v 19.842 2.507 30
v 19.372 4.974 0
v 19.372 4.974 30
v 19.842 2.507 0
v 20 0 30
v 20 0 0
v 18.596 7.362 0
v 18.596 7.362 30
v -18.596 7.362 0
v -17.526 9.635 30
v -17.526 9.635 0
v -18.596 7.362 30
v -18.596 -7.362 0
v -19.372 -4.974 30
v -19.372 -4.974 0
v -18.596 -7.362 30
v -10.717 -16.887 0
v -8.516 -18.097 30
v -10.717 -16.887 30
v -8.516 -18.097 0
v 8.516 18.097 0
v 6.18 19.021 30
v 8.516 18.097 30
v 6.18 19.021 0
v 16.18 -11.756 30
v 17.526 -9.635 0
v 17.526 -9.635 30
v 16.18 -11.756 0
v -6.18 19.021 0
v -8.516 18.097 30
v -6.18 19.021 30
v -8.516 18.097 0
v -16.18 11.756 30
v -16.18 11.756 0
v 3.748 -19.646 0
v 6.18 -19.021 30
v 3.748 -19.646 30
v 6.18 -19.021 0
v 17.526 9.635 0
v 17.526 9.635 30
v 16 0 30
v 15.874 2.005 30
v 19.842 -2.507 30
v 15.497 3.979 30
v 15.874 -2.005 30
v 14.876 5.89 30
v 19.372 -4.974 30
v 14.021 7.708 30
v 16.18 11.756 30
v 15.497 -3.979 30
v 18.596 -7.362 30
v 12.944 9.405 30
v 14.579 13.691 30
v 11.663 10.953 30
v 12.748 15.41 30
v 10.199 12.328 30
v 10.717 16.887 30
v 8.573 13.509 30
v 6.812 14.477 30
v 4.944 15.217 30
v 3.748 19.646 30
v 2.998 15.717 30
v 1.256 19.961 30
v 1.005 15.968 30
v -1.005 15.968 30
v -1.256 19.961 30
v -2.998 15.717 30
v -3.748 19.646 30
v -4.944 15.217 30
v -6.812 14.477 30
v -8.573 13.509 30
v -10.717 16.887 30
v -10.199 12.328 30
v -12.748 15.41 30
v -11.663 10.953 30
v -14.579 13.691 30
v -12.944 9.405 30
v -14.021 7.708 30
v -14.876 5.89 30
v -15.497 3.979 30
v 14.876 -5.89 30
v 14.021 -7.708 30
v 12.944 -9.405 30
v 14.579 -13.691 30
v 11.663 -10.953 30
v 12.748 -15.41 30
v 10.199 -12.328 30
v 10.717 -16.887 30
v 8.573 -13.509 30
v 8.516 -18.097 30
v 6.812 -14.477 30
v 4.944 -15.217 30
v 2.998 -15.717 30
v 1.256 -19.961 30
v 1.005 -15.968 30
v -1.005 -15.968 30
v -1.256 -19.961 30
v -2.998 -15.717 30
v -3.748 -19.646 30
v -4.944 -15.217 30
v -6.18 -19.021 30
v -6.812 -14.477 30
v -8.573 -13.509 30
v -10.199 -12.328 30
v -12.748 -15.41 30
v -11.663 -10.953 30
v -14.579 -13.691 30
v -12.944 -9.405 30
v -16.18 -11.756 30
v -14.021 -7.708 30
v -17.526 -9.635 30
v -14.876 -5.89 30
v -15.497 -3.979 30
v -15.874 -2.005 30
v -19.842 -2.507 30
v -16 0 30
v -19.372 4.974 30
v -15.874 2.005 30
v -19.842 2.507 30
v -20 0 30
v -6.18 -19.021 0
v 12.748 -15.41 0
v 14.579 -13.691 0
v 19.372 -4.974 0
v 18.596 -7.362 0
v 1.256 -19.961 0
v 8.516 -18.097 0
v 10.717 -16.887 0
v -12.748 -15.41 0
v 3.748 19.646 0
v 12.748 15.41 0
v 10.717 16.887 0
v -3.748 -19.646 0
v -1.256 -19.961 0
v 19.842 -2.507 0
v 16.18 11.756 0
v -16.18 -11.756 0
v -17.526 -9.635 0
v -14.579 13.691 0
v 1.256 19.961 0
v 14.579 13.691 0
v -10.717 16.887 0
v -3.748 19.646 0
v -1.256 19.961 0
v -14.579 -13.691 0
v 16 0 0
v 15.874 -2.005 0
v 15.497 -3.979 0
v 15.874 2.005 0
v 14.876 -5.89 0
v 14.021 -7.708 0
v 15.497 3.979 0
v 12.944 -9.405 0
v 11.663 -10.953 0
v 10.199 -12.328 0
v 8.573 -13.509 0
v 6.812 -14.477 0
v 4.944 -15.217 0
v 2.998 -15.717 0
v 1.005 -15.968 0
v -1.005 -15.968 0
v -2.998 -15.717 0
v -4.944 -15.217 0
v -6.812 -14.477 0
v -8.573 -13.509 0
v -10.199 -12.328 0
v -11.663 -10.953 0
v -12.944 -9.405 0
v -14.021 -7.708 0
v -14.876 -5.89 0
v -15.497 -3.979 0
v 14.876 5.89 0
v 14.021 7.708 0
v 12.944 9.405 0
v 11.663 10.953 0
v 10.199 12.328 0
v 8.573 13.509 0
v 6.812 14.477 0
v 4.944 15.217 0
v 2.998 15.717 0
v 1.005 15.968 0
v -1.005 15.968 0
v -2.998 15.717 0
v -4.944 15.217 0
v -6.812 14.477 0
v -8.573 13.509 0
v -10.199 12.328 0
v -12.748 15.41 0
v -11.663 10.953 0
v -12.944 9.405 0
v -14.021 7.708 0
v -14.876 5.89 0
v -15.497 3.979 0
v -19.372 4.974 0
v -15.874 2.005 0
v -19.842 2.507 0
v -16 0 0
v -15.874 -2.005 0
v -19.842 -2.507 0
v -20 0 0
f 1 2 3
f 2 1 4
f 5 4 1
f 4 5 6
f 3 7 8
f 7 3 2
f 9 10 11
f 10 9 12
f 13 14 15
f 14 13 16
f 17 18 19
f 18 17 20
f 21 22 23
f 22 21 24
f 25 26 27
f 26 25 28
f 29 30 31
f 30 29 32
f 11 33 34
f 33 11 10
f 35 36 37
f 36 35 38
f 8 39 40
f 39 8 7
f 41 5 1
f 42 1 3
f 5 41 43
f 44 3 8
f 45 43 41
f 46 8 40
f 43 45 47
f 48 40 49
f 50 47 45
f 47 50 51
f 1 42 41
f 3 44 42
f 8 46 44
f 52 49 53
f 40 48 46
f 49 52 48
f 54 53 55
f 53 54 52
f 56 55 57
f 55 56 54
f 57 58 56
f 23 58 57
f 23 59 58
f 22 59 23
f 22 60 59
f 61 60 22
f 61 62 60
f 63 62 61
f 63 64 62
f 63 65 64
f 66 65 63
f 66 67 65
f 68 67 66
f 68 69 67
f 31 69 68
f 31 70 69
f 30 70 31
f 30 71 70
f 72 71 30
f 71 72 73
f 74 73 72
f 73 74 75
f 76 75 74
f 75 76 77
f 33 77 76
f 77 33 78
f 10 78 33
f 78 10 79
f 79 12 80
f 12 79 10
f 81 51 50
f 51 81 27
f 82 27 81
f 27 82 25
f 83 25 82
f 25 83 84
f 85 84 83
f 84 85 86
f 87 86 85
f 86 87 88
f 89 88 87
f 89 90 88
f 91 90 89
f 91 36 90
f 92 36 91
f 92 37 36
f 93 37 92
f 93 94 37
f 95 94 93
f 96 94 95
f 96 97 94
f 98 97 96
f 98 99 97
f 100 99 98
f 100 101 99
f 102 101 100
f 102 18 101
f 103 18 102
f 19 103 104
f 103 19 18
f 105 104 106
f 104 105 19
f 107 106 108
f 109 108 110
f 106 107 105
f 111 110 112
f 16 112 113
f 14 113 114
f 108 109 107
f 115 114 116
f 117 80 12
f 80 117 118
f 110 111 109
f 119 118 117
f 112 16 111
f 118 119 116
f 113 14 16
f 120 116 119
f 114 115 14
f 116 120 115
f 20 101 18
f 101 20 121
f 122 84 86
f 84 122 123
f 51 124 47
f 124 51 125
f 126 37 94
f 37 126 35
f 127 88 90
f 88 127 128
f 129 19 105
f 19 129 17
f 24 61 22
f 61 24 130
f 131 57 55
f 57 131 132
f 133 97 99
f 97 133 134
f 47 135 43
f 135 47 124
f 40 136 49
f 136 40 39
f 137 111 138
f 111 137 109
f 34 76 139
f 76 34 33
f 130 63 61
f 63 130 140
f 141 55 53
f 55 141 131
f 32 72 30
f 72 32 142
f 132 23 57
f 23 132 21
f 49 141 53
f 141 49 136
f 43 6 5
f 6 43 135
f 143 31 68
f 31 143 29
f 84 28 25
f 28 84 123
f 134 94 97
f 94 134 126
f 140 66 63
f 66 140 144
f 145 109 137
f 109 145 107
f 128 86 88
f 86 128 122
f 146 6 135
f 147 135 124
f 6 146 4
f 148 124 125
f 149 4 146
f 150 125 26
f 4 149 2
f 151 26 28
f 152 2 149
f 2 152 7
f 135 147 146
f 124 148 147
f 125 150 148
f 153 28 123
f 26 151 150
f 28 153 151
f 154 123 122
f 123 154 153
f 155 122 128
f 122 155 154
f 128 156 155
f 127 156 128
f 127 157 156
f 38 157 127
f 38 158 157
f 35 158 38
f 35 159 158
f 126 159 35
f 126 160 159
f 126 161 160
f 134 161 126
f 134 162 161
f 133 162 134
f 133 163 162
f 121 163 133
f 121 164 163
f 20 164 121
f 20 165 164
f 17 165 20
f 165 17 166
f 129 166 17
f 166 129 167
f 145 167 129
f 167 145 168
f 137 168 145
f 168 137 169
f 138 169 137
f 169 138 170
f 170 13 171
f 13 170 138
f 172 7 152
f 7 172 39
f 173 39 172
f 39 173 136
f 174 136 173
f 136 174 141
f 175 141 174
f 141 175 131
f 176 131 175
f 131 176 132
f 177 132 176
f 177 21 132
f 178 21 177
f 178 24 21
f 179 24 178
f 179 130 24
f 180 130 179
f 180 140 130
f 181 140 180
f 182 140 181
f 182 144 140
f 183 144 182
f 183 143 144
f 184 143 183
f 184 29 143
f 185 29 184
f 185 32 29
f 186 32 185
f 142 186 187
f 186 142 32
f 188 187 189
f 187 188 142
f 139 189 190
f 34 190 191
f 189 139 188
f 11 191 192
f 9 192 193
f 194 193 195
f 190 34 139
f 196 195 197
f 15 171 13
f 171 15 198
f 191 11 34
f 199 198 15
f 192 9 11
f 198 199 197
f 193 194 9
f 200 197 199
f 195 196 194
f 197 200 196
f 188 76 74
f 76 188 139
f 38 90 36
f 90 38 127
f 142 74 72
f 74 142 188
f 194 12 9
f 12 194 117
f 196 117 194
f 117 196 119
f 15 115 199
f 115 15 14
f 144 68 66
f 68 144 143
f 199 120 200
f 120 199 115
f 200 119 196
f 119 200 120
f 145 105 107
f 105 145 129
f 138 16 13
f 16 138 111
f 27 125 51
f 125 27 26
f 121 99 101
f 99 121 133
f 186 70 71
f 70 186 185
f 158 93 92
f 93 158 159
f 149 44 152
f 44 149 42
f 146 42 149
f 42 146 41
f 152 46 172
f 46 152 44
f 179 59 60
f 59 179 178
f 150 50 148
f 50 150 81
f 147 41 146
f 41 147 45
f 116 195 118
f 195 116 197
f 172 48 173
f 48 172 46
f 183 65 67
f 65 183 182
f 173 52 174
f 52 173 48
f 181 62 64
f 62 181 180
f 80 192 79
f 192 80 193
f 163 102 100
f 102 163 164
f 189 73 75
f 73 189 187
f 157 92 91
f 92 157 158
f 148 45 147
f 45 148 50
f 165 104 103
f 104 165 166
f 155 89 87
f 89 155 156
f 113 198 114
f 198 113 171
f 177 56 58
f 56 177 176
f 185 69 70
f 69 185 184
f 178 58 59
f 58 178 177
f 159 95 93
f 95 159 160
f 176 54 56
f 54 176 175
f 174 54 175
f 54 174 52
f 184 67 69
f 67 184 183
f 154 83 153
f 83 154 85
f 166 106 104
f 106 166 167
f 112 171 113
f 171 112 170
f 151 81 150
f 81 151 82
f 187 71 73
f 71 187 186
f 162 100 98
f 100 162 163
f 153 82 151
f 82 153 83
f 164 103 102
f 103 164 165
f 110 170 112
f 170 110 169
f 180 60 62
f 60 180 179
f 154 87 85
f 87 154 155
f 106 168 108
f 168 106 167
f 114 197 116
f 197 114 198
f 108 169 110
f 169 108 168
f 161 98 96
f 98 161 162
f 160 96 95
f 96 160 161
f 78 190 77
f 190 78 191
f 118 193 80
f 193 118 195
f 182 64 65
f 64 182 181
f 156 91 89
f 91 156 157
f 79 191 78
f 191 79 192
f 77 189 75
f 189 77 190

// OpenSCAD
//	Rocket tube cutting guide
//  by Bryan Duke @GrouchoDuke

//  modified code from Justblair's Parametric Model Rocket Fin Alignment Tool

// Parametric 

tube_diameter	=	32 		;//mm measured tube outer diameter  
jig_height		=	30		;//mm height of jig
wall_thickness	=	4  		;//mm desired wall thickness
$fn = 50;  // Changes the smoothness of the curves


difference(){
	// Create the solid shapes 
			cylinder (r = (tube_diameter/2) + wall_thickness, h =jig_height);
	
	// Create the cutout shapes
	
	// Rocket tube body
	translate ([0,0,-0.5])
		cylinder (r=tube_diameter/2, h = jig_height + 10 );


}
